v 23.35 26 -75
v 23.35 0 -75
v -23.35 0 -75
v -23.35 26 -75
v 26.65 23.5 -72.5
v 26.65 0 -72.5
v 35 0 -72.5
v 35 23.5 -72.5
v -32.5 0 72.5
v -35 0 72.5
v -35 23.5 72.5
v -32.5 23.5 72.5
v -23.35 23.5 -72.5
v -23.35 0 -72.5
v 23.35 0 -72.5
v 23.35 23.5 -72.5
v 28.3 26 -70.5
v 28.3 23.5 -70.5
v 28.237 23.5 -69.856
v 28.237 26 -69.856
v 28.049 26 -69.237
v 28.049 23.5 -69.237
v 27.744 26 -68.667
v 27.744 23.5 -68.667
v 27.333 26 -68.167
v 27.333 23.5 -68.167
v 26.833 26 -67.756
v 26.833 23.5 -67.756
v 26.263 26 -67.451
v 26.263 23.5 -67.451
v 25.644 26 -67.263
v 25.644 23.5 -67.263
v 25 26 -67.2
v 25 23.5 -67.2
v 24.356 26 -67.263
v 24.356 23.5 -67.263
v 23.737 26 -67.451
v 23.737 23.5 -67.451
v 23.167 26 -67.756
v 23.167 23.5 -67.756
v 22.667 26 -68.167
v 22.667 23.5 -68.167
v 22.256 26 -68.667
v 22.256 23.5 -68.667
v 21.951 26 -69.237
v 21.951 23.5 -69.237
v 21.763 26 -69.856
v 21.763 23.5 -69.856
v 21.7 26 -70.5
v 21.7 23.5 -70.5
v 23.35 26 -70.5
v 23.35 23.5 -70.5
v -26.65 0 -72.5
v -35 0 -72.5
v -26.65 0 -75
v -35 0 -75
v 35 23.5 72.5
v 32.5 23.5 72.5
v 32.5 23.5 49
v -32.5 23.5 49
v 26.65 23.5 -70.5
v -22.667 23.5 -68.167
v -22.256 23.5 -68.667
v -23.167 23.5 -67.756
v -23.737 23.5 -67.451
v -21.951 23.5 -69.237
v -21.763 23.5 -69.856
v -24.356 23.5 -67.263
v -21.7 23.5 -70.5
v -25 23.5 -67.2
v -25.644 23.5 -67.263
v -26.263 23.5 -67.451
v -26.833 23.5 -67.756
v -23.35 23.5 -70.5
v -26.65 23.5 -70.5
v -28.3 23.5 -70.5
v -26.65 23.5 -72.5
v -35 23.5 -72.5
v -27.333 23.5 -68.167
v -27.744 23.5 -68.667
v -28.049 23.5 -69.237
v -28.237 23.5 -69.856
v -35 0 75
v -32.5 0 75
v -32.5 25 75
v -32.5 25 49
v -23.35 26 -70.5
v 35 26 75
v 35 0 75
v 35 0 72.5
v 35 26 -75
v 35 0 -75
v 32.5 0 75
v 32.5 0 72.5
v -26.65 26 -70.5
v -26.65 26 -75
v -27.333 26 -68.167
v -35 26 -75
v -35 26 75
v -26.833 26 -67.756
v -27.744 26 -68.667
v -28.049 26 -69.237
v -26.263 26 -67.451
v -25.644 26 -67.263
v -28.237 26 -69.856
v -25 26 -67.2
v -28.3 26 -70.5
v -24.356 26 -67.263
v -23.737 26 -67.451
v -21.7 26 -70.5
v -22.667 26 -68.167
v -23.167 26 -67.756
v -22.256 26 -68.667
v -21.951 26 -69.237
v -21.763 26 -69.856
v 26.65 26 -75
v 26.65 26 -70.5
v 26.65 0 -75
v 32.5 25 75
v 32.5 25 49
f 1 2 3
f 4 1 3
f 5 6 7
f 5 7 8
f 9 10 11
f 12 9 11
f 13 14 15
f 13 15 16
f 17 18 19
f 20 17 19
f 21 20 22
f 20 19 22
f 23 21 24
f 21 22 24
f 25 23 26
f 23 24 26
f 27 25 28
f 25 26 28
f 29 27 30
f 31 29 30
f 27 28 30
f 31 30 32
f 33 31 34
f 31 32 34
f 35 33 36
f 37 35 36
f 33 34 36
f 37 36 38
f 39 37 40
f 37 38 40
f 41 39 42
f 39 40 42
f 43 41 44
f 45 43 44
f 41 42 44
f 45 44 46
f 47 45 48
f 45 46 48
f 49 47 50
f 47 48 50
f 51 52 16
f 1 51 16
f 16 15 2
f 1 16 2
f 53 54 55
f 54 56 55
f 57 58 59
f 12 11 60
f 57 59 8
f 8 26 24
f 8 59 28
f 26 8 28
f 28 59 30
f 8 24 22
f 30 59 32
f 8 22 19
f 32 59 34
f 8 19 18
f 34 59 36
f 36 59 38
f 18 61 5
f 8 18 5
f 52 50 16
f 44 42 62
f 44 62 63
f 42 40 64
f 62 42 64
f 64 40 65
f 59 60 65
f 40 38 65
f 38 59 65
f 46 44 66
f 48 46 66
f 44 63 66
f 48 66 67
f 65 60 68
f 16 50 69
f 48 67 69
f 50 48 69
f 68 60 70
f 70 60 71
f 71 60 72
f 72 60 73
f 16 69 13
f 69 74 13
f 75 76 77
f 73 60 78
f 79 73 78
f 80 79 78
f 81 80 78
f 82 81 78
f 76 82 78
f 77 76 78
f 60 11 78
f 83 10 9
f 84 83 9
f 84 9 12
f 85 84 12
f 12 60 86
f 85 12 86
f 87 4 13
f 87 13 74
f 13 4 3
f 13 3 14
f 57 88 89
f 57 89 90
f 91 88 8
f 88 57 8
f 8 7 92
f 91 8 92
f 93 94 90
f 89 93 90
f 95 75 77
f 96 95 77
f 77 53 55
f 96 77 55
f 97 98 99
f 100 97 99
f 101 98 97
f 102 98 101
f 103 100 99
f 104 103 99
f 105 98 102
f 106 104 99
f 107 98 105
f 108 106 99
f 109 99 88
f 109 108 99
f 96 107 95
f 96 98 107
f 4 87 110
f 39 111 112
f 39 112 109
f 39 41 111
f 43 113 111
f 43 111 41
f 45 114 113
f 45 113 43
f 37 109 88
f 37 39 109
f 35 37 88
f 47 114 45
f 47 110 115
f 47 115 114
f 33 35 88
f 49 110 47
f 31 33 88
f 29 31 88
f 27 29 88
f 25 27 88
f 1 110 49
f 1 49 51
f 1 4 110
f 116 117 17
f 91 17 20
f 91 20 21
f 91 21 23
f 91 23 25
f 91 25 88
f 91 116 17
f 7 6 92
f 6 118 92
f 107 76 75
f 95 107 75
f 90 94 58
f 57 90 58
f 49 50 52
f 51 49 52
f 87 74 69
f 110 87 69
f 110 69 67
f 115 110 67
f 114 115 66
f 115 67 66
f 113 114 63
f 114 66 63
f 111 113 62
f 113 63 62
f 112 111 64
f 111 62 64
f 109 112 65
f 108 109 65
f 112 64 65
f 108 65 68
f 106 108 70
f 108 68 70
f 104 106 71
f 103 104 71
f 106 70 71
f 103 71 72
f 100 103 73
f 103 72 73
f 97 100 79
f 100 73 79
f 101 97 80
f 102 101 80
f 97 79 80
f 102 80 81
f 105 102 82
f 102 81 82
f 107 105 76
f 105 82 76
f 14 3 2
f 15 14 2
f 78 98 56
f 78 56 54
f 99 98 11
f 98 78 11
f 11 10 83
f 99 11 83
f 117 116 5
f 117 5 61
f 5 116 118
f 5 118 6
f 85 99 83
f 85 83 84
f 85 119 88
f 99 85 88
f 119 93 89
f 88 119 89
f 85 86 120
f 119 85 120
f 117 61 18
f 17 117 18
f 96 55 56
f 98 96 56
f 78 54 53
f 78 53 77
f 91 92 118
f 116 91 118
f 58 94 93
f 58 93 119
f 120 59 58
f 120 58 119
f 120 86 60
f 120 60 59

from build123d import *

# Parameters (mm, degrees)
BOSS_EXTRUDE1_DEPTH     = 26
CUT_EXTRUDE1_DEPTH      = 106.834776893
CUT_EXTRUDE1_DEPTH_BACK = 106.834776893
SKETCH3_W               = 145
SKETCH3_H               = 23.5
CUT_EXTRUDE2_DEPTH      = 157.208194407
CUT_EXTRUDE2_DEPTH_BACK = 26
SKETCH4_W               = 65
SKETCH4_H               = 25


with BuildPart() as part:
    # Sketch2 → Boss-Extrude1 (new body)
    with BuildSketch(Plane(origin=(0, 0, 0), x_dir=(1, 0, 0), z_dir=(0, 1, 0))):
        with BuildLine():
            Line((-26.65, 70.5), (-26.65, 75))
            Line((-26.65, 75), (-35, 75))
            Line((-35, 75), (-35, -75))
            Line((-35, -75), (35, -75))
            Line((35, -75), (35, 75))
            Line((35, 75), (26.65, 75))
            Line((26.65, 75), (26.65, 70.5))
            Line((26.65, 70.5), (28.3, 70.5))
            ThreePointArc((28.3, 70.5), (25, 67.2), (21.7, 70.5))
            Line((21.7, 70.5), (23.35, 70.5))
            Line((23.35, 70.5), (23.35, 75))
            Line((23.35, 75), (-23.35, 75))
            Line((-23.35, 75), (-23.35, 70.5))
            Line((-23.35, 70.5), (-21.7, 70.5))
            ThreePointArc((-21.7, 70.5), (-25, 67.2), (-28.3, 70.5))
            Line((-28.3, 70.5), (-26.65, 70.5))
        make_face()
    extrude(amount=BOSS_EXTRUDE1_DEPTH)

    # Sketch3 → Cut-Extrude1 (cut, two sides: drawn at the far end of the back side and taken through both)
    with BuildSketch(Plane(origin=(35, 0, 0), x_dir=(0, 0, -1), z_dir=(1, 0, 0)).offset(-CUT_EXTRUDE1_DEPTH_BACK)):
        with Locations((0, 11.75)):
            Rectangle(SKETCH3_W, SKETCH3_H)
    extrude(amount=CUT_EXTRUDE1_DEPTH + CUT_EXTRUDE1_DEPTH_BACK, mode=Mode.SUBTRACT)

    # Sketch4 → Cut-Extrude2 (cut, two sides: drawn at the far end of the back side and taken through both)
    with BuildSketch(Plane.XY.offset(75).offset(-CUT_EXTRUDE2_DEPTH_BACK)):
        with Locations((0, 12.5)):
            Rectangle(SKETCH4_W, SKETCH4_H)
    extrude(amount=CUT_EXTRUDE2_DEPTH + CUT_EXTRUDE2_DEPTH_BACK, mode=Mode.SUBTRACT)


solid = part.part
